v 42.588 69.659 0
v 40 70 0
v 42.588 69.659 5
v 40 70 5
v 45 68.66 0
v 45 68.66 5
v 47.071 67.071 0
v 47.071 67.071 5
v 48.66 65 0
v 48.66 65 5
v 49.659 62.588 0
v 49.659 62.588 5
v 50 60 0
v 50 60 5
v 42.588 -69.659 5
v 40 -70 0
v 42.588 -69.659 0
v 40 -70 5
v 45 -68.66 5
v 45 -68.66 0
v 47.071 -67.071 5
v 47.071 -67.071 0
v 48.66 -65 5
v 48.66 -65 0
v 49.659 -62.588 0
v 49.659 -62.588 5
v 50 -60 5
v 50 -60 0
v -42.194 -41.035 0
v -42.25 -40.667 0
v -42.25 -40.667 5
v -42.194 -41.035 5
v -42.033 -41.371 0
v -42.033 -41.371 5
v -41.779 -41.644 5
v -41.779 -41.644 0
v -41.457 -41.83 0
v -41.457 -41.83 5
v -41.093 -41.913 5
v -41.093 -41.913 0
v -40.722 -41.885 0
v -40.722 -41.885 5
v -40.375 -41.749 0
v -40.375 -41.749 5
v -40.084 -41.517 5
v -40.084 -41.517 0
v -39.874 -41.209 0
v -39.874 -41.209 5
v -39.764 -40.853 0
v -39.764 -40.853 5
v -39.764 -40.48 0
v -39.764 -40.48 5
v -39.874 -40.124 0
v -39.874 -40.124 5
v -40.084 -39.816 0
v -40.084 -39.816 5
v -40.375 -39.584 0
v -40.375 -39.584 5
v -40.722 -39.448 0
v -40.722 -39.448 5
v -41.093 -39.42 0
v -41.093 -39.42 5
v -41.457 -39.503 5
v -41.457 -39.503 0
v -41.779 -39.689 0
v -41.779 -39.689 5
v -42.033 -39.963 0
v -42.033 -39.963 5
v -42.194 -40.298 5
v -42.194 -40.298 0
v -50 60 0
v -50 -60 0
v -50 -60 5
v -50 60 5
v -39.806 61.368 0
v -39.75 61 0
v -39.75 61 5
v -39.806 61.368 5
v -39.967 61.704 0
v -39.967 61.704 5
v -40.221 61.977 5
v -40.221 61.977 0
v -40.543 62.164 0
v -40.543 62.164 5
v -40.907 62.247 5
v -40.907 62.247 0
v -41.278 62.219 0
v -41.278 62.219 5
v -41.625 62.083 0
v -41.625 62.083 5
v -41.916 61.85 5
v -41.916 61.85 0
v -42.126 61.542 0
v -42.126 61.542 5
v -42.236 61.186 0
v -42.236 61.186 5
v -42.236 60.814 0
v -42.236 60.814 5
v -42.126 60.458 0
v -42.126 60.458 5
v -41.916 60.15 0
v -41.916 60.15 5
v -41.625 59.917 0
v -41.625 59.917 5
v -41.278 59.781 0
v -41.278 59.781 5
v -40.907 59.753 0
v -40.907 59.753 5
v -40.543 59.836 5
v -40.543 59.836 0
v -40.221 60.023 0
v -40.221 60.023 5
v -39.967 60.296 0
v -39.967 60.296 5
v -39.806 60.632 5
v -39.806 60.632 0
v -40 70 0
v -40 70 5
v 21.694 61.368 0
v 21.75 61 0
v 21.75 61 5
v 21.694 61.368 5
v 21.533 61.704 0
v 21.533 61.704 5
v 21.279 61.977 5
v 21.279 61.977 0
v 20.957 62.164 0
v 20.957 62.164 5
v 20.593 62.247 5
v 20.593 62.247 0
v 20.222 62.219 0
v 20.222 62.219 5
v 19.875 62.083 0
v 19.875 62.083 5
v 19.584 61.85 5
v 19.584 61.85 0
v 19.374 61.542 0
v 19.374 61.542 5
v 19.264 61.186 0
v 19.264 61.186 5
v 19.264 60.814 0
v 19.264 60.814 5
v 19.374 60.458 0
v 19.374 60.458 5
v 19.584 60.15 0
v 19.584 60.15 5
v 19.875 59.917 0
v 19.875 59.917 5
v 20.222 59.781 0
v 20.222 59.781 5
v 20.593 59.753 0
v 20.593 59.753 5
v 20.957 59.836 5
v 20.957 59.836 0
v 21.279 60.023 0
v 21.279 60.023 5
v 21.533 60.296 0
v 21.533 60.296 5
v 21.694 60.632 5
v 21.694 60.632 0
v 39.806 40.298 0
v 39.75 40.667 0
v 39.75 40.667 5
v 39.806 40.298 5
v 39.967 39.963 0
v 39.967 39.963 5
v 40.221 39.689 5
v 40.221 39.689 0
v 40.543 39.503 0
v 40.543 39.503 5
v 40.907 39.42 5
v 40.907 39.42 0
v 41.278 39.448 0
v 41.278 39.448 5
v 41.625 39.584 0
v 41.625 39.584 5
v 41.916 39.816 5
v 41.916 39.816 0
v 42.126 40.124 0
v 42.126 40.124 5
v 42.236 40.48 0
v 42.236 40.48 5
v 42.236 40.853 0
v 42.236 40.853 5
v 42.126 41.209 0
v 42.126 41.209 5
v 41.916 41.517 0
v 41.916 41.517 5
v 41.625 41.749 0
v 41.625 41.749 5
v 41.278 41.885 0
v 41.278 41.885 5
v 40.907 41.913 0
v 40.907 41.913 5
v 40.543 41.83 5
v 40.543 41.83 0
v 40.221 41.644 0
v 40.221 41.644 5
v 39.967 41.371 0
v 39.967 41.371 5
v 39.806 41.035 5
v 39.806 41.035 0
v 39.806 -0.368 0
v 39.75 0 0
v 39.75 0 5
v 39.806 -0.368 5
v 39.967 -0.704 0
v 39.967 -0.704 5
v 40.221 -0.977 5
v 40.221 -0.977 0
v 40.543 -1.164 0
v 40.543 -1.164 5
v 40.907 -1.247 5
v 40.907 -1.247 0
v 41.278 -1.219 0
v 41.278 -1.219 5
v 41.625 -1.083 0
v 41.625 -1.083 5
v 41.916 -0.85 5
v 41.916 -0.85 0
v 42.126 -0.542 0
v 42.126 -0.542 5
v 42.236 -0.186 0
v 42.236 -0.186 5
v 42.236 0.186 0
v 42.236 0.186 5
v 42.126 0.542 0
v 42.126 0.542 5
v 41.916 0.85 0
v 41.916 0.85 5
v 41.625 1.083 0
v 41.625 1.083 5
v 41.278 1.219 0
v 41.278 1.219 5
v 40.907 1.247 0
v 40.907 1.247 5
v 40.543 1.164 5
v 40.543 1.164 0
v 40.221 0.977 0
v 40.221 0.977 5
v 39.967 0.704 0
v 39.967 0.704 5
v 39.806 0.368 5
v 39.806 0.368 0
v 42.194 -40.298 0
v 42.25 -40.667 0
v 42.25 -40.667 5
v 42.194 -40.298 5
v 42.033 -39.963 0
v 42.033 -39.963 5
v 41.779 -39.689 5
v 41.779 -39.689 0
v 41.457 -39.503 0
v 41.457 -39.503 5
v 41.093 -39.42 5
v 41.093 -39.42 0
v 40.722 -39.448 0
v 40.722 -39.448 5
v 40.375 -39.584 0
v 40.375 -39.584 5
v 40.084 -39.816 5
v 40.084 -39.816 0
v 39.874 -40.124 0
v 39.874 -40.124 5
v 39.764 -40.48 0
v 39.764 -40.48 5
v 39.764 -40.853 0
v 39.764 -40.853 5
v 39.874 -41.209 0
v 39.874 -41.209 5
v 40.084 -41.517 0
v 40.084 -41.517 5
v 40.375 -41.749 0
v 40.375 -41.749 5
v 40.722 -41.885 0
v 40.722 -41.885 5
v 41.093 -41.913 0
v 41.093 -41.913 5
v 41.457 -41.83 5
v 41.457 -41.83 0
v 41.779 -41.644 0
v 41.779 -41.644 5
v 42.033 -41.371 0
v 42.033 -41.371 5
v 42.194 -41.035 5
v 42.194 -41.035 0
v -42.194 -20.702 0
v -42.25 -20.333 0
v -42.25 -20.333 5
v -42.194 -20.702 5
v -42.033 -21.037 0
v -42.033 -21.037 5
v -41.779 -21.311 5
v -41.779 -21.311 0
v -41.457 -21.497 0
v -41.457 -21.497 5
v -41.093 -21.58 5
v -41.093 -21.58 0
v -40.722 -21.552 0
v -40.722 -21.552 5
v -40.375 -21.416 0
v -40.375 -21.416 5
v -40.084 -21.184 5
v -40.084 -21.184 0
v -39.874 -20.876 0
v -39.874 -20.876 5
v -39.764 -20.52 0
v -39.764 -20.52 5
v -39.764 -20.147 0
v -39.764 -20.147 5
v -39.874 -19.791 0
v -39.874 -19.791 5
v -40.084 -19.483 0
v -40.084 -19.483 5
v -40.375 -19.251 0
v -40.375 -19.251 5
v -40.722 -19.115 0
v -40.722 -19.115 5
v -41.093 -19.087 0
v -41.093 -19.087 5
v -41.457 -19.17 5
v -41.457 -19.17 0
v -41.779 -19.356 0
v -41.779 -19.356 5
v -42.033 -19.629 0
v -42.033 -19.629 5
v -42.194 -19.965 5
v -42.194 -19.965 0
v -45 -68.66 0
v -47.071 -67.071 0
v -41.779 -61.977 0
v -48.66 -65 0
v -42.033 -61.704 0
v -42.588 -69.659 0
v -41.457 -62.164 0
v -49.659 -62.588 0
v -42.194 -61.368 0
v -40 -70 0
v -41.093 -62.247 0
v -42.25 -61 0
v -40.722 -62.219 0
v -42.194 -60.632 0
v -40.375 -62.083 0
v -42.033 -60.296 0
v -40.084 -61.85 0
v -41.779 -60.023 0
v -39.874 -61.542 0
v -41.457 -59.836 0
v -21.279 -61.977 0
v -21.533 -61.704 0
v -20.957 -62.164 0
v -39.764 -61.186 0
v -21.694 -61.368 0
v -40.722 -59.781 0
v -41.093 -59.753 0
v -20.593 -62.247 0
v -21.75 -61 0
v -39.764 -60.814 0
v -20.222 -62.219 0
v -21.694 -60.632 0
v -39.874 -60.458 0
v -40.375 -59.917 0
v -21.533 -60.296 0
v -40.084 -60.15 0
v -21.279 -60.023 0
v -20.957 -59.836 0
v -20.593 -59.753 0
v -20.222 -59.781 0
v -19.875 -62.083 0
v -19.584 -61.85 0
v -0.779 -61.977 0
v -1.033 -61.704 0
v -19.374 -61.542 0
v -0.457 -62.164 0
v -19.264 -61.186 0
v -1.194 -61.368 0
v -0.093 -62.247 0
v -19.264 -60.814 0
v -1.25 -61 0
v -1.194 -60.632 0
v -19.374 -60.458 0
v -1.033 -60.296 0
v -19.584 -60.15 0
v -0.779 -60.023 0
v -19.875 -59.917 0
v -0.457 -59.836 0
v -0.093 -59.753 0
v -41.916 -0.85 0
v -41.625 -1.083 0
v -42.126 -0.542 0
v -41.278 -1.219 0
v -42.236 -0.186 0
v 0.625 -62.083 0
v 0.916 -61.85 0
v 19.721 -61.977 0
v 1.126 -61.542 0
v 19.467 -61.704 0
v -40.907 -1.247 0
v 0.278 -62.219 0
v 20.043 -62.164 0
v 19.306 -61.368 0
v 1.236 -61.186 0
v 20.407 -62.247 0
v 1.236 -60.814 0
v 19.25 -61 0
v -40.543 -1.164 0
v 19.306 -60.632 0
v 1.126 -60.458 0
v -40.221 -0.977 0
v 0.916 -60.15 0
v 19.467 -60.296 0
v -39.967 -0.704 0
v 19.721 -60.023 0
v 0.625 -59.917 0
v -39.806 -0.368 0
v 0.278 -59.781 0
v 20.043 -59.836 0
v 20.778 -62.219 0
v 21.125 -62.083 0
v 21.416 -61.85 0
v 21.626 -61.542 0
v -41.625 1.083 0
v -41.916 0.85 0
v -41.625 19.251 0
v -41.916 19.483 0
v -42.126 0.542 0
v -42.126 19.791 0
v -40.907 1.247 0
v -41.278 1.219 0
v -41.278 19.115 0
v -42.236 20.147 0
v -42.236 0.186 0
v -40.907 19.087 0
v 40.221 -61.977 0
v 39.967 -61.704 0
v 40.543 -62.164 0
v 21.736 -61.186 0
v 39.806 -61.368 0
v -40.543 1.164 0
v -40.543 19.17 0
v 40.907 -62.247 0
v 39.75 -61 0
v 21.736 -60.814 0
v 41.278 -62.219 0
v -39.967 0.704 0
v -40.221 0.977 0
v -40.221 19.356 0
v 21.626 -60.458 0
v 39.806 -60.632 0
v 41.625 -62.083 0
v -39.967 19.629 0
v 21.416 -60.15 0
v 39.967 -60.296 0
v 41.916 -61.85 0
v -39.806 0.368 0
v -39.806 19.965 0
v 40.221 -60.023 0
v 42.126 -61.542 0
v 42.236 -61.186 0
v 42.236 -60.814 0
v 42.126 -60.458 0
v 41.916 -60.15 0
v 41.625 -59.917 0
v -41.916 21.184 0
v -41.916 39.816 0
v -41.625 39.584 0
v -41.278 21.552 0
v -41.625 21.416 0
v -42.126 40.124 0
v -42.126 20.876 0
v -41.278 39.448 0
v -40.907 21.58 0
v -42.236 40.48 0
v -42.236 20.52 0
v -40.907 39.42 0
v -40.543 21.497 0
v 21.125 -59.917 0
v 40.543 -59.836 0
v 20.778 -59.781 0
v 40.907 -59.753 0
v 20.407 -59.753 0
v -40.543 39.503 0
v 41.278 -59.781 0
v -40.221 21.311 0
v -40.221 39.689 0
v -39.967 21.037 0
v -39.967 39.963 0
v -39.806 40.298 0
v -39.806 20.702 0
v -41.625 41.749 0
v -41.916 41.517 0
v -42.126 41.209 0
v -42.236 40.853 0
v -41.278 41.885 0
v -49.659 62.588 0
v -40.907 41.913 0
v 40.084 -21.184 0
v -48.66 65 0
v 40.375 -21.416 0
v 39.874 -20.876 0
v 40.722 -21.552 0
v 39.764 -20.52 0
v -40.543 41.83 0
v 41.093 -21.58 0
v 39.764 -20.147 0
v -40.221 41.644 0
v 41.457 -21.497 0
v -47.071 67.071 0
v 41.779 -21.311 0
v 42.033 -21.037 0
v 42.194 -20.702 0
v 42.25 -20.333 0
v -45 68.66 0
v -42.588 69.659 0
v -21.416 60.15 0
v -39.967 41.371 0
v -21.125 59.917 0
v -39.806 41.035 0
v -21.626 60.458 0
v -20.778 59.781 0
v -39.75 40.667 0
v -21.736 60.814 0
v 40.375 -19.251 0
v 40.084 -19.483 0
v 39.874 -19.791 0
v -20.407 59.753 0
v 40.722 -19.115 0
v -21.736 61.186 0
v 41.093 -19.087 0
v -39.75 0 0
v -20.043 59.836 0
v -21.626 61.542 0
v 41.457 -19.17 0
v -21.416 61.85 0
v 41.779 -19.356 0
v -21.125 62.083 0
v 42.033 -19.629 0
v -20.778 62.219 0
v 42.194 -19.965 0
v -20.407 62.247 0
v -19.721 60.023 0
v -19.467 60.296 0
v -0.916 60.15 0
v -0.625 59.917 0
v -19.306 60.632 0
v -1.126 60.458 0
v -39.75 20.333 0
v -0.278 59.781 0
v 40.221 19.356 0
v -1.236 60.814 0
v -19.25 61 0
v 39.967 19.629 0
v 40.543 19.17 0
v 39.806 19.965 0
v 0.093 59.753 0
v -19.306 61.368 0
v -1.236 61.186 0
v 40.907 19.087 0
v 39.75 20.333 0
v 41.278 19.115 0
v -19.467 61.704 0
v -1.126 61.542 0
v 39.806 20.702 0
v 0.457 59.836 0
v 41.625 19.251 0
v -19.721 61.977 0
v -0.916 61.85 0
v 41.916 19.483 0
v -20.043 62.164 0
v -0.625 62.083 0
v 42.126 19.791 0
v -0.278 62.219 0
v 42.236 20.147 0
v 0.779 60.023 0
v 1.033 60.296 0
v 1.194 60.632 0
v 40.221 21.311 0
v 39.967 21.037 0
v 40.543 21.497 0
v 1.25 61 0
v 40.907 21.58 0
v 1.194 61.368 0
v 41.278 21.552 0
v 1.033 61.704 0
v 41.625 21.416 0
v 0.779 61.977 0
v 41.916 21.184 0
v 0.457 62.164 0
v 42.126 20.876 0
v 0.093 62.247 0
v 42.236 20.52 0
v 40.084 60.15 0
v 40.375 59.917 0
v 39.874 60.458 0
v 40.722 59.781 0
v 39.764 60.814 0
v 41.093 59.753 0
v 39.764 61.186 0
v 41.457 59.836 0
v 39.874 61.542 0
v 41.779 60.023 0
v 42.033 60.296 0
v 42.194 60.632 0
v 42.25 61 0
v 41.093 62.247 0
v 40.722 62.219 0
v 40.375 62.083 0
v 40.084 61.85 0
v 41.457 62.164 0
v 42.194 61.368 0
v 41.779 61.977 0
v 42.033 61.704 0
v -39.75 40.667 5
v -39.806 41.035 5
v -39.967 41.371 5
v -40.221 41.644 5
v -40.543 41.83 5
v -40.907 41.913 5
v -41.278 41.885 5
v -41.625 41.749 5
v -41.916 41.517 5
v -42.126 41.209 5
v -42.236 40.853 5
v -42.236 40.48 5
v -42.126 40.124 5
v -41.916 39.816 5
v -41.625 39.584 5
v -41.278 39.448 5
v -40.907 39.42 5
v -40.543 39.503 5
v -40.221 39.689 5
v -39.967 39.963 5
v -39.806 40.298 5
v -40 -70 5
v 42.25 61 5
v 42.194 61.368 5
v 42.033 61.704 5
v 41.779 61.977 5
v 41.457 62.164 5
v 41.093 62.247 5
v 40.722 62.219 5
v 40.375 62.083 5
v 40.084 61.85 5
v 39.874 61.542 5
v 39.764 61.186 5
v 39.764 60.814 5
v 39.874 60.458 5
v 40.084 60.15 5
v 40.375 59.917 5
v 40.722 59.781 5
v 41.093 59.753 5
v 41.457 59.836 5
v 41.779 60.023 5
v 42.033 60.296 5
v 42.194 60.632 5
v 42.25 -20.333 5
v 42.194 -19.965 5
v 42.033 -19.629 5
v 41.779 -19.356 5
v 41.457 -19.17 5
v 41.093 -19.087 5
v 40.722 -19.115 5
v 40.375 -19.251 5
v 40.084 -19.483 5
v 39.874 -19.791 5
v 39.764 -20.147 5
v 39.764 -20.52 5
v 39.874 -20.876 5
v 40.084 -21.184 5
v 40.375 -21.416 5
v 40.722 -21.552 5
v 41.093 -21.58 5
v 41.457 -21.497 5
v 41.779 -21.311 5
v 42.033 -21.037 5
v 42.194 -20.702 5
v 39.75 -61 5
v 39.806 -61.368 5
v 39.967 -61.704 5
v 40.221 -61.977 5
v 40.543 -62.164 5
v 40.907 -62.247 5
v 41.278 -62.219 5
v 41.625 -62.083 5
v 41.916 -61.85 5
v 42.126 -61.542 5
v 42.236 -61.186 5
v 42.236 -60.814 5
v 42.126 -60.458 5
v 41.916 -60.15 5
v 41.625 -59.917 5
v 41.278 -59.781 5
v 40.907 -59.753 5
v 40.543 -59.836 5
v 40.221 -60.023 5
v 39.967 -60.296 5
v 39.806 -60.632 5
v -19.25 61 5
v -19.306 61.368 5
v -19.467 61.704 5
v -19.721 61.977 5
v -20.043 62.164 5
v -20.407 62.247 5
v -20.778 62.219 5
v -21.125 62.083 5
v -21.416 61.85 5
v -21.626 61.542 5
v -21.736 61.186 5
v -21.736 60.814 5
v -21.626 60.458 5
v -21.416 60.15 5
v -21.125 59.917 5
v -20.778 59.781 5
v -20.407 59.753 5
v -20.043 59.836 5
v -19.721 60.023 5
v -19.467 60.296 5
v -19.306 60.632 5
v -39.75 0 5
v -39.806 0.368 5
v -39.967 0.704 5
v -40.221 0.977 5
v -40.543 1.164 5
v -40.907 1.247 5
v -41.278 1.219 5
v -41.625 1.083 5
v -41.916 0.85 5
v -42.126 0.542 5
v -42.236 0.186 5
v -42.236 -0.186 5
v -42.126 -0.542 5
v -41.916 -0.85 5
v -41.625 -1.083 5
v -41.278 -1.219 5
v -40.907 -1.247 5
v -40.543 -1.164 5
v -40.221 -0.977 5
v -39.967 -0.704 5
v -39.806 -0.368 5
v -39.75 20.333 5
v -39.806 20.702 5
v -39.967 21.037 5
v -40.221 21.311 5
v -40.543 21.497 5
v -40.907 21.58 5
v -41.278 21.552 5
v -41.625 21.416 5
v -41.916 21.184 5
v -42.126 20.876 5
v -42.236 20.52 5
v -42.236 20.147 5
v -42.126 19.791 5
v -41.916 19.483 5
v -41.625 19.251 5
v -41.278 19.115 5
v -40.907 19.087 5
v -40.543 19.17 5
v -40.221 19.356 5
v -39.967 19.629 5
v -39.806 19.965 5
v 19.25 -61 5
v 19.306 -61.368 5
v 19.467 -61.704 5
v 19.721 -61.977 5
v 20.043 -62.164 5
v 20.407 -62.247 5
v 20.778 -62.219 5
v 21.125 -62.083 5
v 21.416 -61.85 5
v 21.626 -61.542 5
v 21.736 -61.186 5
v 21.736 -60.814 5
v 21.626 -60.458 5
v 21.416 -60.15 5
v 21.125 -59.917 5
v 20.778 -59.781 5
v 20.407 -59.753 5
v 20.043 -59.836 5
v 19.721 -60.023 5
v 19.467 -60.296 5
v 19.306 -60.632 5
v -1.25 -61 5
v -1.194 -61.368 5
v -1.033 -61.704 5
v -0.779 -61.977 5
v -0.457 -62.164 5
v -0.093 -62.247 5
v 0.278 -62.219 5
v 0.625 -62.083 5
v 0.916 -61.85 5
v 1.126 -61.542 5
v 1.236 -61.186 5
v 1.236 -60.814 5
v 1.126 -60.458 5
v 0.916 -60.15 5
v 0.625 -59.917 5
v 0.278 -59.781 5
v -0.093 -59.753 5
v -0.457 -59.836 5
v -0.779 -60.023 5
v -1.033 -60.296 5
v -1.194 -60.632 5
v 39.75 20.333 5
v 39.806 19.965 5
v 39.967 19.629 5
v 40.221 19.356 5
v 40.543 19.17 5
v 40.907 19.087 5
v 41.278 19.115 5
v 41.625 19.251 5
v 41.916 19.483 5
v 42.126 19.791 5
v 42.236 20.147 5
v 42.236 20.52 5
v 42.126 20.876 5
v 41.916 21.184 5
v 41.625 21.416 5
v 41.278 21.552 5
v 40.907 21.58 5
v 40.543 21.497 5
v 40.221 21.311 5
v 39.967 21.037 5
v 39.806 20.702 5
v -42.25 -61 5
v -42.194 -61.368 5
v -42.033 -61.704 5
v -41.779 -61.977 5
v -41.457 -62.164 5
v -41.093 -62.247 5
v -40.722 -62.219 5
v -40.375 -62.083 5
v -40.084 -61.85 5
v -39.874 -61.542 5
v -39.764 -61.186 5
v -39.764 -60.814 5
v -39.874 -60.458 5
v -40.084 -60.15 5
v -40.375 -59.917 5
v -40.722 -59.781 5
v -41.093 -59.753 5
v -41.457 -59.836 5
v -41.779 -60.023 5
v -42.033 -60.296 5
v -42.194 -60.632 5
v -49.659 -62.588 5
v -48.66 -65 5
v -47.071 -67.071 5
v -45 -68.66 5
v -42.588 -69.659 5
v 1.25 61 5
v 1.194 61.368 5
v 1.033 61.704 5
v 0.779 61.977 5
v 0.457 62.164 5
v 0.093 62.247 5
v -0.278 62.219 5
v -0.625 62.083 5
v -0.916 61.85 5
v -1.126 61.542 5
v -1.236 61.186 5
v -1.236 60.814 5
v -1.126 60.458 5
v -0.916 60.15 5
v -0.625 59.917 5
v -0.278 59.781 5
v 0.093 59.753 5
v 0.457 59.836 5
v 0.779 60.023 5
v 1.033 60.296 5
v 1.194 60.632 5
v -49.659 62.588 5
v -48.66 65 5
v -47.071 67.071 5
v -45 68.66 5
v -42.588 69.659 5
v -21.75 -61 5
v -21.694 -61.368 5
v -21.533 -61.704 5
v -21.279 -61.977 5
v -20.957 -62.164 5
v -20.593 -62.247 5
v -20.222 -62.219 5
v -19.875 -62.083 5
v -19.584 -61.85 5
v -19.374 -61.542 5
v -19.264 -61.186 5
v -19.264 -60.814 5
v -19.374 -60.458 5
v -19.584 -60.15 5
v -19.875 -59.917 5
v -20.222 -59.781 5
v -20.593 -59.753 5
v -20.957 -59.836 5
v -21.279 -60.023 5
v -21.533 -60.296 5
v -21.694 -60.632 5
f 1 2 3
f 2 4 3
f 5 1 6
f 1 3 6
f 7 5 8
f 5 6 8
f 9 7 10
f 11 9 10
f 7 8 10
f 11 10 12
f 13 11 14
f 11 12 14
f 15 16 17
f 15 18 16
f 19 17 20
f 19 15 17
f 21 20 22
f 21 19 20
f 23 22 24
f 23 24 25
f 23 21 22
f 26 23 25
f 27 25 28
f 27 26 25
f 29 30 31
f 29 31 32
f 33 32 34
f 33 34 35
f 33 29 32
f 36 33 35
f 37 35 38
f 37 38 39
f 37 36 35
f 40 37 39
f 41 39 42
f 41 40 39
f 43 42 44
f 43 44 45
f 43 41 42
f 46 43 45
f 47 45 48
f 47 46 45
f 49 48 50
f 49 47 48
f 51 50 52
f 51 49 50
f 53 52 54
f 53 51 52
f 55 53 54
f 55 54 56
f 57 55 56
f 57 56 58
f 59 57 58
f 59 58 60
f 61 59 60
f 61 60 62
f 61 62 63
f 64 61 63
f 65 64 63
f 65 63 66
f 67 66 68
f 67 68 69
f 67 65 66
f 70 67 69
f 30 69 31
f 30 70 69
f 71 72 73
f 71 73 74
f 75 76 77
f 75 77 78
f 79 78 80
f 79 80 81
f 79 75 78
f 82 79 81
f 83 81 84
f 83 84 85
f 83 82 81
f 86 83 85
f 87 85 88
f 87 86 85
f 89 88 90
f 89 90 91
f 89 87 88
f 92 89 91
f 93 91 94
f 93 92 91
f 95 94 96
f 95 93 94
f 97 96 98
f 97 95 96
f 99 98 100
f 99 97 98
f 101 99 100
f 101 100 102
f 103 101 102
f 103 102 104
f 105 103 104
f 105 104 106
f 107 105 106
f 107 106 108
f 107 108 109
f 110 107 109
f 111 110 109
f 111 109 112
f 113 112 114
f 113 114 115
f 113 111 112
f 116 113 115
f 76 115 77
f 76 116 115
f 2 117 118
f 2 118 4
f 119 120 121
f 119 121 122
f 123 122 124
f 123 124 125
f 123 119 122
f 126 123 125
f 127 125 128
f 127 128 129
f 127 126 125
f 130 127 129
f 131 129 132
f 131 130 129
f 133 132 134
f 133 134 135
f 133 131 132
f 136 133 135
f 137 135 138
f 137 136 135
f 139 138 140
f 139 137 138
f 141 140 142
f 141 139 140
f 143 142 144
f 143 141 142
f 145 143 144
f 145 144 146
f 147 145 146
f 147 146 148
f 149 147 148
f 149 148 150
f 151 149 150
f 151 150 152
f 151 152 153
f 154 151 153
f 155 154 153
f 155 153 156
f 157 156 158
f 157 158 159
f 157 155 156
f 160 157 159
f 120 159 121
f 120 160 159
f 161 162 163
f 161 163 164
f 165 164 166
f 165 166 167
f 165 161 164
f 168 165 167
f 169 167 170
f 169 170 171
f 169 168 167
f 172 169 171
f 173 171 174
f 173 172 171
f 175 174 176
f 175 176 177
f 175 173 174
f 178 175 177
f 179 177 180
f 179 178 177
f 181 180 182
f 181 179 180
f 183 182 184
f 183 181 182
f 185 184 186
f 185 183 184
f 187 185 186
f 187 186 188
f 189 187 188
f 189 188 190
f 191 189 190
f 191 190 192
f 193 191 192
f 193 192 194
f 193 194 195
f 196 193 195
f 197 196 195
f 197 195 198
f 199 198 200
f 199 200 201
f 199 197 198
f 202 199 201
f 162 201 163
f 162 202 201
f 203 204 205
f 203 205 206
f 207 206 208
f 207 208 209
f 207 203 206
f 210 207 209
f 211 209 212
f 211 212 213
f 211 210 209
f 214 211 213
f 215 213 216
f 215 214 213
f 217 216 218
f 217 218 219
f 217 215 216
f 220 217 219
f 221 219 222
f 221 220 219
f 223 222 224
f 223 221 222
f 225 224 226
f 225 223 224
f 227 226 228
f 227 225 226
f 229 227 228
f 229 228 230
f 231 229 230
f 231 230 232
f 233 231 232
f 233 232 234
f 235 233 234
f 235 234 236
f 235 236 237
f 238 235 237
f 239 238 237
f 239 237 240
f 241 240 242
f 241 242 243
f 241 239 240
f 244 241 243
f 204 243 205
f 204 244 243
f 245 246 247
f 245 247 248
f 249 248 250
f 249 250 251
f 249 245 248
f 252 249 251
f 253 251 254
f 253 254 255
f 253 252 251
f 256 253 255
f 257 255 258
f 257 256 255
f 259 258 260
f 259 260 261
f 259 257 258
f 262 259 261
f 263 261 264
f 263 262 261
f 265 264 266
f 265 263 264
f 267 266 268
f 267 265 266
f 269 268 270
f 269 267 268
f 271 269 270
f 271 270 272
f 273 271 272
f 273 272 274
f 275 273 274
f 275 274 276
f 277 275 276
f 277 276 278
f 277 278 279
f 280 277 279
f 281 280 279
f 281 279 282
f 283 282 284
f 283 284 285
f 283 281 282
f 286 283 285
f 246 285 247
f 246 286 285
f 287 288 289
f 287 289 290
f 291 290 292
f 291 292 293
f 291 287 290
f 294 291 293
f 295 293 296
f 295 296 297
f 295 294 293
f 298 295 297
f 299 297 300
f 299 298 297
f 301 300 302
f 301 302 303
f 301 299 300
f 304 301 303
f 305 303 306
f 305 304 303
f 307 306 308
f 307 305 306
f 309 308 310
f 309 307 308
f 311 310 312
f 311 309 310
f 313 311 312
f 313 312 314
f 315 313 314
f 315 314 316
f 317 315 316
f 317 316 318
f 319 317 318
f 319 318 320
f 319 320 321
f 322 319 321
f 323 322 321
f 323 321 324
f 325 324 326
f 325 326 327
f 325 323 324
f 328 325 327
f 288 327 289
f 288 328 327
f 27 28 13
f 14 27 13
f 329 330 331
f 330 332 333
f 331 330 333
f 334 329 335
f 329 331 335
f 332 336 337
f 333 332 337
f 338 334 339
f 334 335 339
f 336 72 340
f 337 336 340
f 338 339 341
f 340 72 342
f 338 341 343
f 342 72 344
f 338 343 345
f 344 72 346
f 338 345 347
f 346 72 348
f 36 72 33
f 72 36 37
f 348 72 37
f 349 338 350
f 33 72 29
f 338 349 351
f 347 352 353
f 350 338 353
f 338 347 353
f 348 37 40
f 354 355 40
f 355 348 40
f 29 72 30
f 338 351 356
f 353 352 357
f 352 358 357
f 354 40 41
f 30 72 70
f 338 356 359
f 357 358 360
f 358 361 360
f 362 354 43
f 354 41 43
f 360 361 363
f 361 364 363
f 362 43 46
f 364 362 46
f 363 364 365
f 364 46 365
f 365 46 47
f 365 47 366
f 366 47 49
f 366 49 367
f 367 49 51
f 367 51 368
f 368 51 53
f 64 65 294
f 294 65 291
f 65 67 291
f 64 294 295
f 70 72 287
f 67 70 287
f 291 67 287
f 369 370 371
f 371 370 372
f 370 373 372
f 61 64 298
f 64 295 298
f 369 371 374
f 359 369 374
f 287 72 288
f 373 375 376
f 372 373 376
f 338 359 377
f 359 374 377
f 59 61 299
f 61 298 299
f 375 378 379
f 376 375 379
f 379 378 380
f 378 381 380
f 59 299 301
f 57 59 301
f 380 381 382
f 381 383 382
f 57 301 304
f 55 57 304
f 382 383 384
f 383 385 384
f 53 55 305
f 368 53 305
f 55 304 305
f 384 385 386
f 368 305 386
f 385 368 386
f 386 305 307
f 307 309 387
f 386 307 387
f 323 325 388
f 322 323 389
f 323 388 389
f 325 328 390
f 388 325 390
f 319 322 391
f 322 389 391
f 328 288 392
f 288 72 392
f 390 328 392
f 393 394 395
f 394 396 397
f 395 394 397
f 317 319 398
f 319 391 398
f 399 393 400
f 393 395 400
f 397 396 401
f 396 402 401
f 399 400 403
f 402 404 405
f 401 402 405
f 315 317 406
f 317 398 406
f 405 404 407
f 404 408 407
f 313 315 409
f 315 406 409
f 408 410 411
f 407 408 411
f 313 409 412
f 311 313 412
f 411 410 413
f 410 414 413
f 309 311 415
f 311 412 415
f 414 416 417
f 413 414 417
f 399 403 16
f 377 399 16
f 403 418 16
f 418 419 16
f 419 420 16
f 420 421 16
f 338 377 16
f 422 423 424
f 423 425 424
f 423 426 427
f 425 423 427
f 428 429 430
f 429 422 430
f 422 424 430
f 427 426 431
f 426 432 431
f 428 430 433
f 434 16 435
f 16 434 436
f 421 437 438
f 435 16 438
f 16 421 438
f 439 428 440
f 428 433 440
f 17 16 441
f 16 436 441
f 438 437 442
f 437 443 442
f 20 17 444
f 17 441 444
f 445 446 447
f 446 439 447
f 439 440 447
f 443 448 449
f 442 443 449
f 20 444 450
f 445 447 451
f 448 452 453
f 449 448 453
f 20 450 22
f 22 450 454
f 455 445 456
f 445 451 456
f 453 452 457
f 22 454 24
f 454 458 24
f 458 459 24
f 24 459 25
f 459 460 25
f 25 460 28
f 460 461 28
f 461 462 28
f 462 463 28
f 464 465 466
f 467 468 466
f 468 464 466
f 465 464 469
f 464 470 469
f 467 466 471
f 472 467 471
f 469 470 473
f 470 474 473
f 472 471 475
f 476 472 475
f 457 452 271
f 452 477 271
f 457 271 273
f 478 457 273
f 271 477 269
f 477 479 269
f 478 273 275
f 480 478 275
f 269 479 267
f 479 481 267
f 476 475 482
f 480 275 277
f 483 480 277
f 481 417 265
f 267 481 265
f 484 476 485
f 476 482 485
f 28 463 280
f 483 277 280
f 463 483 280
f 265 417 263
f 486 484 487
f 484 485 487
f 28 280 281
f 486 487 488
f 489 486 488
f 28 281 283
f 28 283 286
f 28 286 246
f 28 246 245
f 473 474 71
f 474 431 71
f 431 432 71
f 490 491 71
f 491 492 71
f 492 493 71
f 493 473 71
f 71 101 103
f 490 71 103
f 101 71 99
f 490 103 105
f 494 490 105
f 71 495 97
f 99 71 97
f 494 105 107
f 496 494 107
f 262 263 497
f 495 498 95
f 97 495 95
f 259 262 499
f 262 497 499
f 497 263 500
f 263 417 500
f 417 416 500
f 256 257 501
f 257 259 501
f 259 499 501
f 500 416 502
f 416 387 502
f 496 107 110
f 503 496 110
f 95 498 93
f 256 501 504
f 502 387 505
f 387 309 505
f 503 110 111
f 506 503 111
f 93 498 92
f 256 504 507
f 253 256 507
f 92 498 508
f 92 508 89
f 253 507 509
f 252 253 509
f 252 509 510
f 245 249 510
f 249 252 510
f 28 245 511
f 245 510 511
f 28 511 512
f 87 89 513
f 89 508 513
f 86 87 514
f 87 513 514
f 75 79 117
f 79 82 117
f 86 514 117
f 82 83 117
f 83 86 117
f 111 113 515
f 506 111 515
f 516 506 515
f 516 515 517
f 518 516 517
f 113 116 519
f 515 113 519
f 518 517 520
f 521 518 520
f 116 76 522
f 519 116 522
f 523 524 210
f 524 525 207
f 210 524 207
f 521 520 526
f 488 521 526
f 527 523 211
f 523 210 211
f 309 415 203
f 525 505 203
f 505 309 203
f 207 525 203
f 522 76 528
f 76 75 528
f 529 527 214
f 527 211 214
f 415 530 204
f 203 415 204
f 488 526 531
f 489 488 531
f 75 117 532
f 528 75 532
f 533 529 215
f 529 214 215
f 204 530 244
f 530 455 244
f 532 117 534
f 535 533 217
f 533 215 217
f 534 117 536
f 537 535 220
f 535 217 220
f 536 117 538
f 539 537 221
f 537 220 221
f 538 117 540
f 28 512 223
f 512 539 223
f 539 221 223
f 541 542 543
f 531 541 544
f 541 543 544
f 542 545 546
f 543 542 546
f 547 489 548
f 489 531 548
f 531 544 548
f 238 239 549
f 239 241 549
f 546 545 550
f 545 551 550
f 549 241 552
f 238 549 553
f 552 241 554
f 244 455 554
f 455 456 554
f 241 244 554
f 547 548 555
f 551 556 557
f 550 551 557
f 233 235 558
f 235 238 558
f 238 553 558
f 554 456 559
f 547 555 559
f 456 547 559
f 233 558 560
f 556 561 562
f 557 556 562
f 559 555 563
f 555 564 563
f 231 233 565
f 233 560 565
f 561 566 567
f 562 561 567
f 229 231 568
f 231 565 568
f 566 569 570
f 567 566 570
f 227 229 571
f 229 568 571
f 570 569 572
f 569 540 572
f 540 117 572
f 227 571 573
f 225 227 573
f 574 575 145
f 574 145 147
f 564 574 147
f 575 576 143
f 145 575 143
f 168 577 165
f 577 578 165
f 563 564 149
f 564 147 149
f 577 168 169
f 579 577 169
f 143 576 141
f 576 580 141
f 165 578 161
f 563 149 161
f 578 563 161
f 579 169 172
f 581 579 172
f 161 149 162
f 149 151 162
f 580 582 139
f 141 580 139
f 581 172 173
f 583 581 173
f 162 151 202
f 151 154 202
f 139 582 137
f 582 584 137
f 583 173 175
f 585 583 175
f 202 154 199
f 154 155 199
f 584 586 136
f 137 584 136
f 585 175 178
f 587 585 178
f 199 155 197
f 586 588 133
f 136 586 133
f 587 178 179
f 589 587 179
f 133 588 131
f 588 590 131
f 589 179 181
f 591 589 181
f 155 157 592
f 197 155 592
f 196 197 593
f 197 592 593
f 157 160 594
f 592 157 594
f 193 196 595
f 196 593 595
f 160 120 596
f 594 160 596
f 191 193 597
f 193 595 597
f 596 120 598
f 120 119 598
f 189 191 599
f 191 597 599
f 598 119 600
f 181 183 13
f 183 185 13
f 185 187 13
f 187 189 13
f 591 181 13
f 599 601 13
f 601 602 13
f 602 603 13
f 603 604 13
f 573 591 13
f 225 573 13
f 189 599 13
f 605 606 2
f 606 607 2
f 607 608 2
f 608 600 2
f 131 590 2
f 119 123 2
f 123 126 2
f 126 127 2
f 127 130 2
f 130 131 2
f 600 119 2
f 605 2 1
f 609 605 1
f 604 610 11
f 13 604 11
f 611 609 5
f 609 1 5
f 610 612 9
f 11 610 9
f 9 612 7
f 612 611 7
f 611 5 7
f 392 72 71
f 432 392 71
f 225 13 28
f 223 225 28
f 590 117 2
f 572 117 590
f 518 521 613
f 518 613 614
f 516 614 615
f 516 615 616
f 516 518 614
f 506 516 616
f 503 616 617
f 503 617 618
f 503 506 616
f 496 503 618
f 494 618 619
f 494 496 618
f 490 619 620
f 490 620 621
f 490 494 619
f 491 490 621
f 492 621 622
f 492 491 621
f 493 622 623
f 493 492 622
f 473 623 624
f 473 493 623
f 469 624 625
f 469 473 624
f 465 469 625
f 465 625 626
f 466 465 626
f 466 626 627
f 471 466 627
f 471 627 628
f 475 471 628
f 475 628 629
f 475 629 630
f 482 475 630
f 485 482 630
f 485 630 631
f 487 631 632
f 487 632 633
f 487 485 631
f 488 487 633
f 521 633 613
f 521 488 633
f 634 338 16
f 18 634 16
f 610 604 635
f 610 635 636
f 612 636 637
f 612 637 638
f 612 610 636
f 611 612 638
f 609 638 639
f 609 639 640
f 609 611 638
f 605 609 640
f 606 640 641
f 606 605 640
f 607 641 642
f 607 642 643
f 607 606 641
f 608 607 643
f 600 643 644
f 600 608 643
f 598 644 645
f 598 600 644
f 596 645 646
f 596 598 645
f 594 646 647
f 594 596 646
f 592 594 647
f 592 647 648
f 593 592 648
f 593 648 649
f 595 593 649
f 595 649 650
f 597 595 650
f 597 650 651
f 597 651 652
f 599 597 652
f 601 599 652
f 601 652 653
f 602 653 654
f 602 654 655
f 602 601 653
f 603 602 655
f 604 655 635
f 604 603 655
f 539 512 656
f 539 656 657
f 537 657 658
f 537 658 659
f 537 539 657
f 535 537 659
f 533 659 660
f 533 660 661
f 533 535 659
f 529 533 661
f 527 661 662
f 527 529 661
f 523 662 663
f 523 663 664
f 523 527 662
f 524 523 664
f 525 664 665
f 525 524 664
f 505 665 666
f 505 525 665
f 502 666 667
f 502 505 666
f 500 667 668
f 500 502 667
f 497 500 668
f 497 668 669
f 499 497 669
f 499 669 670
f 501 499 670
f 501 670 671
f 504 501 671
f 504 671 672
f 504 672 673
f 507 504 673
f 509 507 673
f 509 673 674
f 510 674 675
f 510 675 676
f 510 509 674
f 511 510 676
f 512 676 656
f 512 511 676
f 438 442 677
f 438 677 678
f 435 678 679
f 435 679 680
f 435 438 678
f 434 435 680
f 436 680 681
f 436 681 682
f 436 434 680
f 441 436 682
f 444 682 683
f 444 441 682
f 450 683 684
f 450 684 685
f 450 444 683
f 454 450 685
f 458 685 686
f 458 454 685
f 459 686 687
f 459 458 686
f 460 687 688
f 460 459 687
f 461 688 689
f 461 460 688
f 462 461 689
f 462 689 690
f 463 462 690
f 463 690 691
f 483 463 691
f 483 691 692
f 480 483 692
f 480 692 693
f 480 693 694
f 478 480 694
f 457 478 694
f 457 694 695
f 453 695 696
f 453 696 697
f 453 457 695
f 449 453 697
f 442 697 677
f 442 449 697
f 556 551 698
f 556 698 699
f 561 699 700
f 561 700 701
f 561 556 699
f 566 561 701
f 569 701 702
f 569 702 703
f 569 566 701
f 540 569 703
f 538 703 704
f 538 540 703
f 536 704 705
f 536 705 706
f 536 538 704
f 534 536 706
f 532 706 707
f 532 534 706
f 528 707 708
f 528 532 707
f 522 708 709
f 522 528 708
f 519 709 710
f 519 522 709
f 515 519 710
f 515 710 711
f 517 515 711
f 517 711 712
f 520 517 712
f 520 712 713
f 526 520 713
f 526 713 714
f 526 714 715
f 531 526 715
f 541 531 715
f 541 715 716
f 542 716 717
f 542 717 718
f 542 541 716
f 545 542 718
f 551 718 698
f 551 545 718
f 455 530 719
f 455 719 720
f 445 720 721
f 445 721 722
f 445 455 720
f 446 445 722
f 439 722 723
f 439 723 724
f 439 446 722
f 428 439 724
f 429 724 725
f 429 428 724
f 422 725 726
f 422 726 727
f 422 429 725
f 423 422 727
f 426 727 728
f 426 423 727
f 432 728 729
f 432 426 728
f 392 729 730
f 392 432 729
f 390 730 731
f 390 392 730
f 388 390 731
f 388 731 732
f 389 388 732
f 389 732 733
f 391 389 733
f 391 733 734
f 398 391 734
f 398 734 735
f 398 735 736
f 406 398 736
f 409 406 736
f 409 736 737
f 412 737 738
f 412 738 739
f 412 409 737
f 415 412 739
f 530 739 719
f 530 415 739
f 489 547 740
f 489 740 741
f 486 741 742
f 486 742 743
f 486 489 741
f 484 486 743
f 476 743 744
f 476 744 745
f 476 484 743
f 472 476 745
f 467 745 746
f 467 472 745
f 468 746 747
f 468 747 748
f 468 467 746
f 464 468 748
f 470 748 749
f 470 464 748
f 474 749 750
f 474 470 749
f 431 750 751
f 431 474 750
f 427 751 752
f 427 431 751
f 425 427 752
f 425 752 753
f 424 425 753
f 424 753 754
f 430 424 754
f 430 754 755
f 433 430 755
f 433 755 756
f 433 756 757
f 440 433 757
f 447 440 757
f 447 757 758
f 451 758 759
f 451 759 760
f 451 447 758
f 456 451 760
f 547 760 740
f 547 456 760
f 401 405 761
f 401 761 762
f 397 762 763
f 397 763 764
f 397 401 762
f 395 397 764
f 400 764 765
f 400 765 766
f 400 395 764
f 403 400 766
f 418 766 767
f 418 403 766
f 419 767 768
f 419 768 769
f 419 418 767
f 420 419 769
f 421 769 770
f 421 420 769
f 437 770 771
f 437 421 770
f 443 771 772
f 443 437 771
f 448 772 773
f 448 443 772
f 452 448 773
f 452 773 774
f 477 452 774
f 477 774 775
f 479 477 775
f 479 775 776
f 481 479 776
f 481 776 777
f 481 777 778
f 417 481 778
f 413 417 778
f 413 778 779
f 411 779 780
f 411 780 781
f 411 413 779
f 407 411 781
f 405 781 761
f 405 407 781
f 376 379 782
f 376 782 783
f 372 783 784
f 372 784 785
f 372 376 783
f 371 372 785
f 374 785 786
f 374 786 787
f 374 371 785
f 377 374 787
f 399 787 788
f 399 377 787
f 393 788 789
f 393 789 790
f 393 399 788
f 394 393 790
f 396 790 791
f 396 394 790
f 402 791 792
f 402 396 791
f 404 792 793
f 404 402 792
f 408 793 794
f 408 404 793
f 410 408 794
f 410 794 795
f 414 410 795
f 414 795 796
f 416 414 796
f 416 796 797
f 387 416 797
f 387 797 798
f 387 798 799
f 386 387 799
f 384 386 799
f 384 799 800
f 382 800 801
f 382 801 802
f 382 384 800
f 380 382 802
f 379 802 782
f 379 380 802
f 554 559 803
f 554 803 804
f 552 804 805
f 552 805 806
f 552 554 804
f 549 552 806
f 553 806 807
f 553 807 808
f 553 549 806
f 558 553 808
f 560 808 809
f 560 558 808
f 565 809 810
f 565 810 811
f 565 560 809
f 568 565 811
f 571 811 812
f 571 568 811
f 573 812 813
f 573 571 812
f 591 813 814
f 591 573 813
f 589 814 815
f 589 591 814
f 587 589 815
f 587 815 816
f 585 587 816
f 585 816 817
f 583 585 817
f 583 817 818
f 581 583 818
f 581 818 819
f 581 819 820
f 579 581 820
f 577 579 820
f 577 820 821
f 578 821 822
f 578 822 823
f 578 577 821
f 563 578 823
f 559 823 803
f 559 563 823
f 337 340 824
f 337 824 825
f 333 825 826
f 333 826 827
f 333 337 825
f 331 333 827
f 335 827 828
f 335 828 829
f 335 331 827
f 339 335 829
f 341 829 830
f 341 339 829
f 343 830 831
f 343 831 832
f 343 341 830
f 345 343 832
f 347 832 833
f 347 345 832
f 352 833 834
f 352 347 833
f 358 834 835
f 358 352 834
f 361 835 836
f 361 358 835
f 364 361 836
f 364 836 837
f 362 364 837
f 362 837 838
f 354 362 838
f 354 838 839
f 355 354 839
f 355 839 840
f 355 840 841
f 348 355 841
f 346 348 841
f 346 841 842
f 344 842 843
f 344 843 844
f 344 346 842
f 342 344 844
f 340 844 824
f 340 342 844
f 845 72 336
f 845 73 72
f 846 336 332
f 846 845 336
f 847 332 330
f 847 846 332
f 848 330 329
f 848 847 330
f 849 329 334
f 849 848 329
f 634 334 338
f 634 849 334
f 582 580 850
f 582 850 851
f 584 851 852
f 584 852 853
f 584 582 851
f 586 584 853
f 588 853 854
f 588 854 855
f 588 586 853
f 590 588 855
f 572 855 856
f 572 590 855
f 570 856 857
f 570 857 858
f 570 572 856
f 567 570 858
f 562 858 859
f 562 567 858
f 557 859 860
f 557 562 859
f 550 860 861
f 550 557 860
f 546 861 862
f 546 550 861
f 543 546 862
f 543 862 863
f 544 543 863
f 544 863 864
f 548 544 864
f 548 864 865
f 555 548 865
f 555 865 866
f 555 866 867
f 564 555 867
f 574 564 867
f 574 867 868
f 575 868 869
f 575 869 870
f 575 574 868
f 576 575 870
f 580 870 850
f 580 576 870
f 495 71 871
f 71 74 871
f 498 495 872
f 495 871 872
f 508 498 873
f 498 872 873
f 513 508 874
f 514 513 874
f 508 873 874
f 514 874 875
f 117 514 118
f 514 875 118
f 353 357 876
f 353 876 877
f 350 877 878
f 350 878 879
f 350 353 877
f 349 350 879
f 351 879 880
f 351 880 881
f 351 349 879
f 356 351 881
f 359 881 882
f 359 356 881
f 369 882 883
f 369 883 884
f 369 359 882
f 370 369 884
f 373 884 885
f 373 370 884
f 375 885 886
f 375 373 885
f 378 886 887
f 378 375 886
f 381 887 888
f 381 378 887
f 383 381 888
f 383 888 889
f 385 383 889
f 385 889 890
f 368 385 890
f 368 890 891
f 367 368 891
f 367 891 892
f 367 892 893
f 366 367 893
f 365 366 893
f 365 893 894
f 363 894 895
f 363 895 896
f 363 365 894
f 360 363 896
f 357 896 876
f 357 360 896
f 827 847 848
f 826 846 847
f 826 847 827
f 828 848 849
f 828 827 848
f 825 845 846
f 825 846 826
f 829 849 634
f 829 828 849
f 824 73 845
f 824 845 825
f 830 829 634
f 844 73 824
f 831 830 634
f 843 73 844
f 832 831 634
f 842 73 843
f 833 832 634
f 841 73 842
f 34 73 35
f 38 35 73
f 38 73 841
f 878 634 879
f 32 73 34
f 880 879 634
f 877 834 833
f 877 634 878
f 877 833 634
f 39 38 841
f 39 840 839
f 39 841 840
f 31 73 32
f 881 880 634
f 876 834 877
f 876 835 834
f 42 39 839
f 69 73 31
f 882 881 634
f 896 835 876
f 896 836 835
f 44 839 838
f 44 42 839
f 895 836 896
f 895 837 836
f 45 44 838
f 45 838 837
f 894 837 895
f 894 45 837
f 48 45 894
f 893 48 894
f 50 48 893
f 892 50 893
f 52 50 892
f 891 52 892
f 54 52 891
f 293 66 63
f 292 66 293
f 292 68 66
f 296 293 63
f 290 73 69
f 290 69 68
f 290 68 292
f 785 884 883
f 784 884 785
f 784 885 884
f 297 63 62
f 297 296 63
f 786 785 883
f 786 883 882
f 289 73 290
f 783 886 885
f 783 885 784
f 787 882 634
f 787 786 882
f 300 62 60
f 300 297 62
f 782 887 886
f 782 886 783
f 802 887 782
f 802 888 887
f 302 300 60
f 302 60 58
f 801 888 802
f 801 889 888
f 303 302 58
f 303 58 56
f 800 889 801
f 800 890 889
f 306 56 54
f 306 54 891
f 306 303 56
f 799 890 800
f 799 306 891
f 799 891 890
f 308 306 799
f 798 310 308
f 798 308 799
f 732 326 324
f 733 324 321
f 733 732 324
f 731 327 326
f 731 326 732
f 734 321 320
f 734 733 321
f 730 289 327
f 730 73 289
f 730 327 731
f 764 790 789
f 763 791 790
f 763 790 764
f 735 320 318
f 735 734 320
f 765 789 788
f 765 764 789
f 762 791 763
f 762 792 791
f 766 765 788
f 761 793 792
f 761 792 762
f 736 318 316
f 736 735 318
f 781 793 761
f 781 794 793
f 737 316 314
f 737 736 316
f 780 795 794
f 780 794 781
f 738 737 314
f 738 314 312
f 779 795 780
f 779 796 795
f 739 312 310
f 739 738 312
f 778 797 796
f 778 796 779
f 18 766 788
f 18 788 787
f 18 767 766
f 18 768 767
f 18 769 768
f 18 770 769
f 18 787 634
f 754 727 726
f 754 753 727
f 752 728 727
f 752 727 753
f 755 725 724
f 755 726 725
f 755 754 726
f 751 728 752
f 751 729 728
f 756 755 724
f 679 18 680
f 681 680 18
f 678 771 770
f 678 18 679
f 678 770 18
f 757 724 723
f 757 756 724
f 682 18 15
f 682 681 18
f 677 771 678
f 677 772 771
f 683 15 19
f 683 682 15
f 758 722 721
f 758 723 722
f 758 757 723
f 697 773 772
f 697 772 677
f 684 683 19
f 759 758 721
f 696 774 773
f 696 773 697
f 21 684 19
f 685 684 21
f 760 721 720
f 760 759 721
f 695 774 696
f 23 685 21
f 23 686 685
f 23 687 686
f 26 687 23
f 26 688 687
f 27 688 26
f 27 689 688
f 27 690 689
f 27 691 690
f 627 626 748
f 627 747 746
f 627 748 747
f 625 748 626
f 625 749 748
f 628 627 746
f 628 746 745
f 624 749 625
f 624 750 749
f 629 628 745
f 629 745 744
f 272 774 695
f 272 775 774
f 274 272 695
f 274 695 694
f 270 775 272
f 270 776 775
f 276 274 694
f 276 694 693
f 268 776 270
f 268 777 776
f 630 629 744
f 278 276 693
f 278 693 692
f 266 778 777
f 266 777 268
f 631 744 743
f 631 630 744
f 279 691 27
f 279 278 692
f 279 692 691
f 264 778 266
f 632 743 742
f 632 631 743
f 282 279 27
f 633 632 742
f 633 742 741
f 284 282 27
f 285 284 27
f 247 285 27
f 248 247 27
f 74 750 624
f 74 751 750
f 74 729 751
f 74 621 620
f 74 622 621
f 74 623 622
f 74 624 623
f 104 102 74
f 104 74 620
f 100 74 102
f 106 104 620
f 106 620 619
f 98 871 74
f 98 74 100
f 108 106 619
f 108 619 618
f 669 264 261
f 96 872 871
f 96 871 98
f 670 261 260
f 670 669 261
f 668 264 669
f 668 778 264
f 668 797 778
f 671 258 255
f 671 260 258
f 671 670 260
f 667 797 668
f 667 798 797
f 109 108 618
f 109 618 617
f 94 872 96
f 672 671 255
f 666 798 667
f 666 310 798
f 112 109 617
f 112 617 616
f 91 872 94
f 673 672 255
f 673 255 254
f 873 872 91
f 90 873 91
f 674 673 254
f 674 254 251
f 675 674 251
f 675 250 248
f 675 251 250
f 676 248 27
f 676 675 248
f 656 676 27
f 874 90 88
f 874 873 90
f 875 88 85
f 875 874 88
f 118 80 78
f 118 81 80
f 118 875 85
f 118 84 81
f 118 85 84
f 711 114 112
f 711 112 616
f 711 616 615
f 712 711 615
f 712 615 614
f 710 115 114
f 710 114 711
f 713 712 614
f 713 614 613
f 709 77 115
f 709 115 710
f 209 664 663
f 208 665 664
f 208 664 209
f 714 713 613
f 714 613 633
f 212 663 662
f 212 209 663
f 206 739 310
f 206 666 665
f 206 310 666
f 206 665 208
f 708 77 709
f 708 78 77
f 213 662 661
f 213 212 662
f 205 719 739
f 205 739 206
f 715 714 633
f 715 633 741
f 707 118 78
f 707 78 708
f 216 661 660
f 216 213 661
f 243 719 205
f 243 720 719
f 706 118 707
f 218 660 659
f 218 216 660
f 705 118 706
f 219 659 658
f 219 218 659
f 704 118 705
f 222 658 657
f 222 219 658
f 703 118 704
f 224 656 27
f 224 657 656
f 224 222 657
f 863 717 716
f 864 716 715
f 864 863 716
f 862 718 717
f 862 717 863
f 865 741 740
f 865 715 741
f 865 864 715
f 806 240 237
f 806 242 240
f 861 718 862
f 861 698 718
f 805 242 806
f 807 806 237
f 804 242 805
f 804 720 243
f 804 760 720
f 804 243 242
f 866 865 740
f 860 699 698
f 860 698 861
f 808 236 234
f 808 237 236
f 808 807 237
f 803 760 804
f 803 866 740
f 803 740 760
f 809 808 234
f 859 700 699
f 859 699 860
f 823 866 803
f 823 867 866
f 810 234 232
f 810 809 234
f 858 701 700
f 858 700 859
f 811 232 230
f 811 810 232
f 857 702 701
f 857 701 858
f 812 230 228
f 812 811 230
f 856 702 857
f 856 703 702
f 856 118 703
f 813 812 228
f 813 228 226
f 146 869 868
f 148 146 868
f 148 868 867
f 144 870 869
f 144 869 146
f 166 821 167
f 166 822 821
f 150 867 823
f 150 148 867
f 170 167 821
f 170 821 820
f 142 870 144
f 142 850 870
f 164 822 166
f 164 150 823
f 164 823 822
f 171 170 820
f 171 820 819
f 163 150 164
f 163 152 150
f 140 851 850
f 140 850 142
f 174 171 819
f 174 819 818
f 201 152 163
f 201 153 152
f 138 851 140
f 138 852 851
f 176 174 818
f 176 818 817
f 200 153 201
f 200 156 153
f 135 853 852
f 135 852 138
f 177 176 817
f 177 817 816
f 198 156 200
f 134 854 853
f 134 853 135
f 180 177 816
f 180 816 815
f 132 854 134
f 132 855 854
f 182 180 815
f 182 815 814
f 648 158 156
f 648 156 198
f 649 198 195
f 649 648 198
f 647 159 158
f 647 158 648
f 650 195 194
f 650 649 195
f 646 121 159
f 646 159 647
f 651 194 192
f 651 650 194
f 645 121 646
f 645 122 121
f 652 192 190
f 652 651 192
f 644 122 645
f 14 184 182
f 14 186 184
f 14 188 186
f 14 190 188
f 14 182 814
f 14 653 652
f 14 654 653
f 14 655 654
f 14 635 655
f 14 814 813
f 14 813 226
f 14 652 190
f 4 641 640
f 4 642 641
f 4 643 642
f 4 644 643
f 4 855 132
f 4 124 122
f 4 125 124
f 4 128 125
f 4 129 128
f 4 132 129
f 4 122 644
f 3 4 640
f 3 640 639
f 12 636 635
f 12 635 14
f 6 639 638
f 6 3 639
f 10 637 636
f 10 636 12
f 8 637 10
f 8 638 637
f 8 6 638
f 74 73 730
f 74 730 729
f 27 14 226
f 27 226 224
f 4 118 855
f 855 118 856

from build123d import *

# Parameters (mm, degrees)
SKETCH1_W           = 100
SKETCH1_H           = 140
SKETCH1_R           = 1.25
BOSS_EXTRUDE1_DEPTH = 5
FILLET1_R           = 10


with BuildPart() as part:
    # Sketch1 → Boss-Extrude1 (new body)
    with BuildSketch(Plane.XY):
        Rectangle(SKETCH1_W, SKETCH1_H)
        with Locations((0, 61)):
            Circle(SKETCH1_R, mode=Mode.SUBTRACT)
        with Locations((-41, 61)):
            Circle(SKETCH1_R, mode=Mode.SUBTRACT)
        with Locations((-20.5, 61)):
            Circle(SKETCH1_R, mode=Mode.SUBTRACT)
        with Locations((20.5, 61)):
            Circle(SKETCH1_R, mode=Mode.SUBTRACT)
        with Locations((41, 61)):
            Circle(SKETCH1_R, mode=Mode.SUBTRACT)
        with Locations((-41, 0)):
            Circle(SKETCH1_R, mode=Mode.SUBTRACT)
        with Locations((-41, 40.666666667)):
            Circle(SKETCH1_R, mode=Mode.SUBTRACT)
        with Locations((-41, 20.333333333)):
            Circle(SKETCH1_R, mode=Mode.SUBTRACT)
        with Locations(Location((41, 40.666666667, 0), (0, 0, 180))):
            Circle(SKETCH1_R, mode=Mode.SUBTRACT)
        with Locations(Location((41, 20.333333333, 0), (0, 0, 180))):
            Circle(SKETCH1_R, mode=Mode.SUBTRACT)
        with Locations(Location((41, 0, 0), (0, 0, 180))):
            Circle(SKETCH1_R, mode=Mode.SUBTRACT)
        with Locations(Location((-20.5, -61, 0), (0, 0, 180))):
            Circle(SKETCH1_R, mode=Mode.SUBTRACT)
        with Locations(Location((0, -61, 0), (0, 0, 180))):
            Circle(SKETCH1_R, mode=Mode.SUBTRACT)
        with Locations(Location((20.5, -61, 0), (0, 0, 180))):
            Circle(SKETCH1_R, mode=Mode.SUBTRACT)
        with Locations(Location((41, -61, 0), (0, 0, 180))):
            Circle(SKETCH1_R, mode=Mode.SUBTRACT)
        with Locations((41, -40.666666667)):
            Circle(SKETCH1_R, mode=Mode.SUBTRACT)
        with Locations((41, -20.333333333)):
            Circle(SKETCH1_R, mode=Mode.SUBTRACT)
        with Locations(Location((-41, -20.333333333, 0), (0, 0, 180))):
            Circle(SKETCH1_R, mode=Mode.SUBTRACT)
        with Locations(Location((-41, -40.666666667, 0), (0, 0, 180))):
            Circle(SKETCH1_R, mode=Mode.SUBTRACT)
        with Locations(Location((-41, -61, 0), (0, 0, 180))):
            Circle(SKETCH1_R, mode=Mode.SUBTRACT)
    extrude(amount=BOSS_EXTRUDE1_DEPTH)

    # Fillet1
    fillet1_edges = [part.edges().sort_by_distance(p)[0] for p in [
        (50, -70, 2.5),
        (-50, -70, 2.5),
        (-50, 70, 2.5),
        (50, 70, 2.5),
    ]]
    fillet(fillet1_edges, radius=FILLET1_R)


solid = part.part
